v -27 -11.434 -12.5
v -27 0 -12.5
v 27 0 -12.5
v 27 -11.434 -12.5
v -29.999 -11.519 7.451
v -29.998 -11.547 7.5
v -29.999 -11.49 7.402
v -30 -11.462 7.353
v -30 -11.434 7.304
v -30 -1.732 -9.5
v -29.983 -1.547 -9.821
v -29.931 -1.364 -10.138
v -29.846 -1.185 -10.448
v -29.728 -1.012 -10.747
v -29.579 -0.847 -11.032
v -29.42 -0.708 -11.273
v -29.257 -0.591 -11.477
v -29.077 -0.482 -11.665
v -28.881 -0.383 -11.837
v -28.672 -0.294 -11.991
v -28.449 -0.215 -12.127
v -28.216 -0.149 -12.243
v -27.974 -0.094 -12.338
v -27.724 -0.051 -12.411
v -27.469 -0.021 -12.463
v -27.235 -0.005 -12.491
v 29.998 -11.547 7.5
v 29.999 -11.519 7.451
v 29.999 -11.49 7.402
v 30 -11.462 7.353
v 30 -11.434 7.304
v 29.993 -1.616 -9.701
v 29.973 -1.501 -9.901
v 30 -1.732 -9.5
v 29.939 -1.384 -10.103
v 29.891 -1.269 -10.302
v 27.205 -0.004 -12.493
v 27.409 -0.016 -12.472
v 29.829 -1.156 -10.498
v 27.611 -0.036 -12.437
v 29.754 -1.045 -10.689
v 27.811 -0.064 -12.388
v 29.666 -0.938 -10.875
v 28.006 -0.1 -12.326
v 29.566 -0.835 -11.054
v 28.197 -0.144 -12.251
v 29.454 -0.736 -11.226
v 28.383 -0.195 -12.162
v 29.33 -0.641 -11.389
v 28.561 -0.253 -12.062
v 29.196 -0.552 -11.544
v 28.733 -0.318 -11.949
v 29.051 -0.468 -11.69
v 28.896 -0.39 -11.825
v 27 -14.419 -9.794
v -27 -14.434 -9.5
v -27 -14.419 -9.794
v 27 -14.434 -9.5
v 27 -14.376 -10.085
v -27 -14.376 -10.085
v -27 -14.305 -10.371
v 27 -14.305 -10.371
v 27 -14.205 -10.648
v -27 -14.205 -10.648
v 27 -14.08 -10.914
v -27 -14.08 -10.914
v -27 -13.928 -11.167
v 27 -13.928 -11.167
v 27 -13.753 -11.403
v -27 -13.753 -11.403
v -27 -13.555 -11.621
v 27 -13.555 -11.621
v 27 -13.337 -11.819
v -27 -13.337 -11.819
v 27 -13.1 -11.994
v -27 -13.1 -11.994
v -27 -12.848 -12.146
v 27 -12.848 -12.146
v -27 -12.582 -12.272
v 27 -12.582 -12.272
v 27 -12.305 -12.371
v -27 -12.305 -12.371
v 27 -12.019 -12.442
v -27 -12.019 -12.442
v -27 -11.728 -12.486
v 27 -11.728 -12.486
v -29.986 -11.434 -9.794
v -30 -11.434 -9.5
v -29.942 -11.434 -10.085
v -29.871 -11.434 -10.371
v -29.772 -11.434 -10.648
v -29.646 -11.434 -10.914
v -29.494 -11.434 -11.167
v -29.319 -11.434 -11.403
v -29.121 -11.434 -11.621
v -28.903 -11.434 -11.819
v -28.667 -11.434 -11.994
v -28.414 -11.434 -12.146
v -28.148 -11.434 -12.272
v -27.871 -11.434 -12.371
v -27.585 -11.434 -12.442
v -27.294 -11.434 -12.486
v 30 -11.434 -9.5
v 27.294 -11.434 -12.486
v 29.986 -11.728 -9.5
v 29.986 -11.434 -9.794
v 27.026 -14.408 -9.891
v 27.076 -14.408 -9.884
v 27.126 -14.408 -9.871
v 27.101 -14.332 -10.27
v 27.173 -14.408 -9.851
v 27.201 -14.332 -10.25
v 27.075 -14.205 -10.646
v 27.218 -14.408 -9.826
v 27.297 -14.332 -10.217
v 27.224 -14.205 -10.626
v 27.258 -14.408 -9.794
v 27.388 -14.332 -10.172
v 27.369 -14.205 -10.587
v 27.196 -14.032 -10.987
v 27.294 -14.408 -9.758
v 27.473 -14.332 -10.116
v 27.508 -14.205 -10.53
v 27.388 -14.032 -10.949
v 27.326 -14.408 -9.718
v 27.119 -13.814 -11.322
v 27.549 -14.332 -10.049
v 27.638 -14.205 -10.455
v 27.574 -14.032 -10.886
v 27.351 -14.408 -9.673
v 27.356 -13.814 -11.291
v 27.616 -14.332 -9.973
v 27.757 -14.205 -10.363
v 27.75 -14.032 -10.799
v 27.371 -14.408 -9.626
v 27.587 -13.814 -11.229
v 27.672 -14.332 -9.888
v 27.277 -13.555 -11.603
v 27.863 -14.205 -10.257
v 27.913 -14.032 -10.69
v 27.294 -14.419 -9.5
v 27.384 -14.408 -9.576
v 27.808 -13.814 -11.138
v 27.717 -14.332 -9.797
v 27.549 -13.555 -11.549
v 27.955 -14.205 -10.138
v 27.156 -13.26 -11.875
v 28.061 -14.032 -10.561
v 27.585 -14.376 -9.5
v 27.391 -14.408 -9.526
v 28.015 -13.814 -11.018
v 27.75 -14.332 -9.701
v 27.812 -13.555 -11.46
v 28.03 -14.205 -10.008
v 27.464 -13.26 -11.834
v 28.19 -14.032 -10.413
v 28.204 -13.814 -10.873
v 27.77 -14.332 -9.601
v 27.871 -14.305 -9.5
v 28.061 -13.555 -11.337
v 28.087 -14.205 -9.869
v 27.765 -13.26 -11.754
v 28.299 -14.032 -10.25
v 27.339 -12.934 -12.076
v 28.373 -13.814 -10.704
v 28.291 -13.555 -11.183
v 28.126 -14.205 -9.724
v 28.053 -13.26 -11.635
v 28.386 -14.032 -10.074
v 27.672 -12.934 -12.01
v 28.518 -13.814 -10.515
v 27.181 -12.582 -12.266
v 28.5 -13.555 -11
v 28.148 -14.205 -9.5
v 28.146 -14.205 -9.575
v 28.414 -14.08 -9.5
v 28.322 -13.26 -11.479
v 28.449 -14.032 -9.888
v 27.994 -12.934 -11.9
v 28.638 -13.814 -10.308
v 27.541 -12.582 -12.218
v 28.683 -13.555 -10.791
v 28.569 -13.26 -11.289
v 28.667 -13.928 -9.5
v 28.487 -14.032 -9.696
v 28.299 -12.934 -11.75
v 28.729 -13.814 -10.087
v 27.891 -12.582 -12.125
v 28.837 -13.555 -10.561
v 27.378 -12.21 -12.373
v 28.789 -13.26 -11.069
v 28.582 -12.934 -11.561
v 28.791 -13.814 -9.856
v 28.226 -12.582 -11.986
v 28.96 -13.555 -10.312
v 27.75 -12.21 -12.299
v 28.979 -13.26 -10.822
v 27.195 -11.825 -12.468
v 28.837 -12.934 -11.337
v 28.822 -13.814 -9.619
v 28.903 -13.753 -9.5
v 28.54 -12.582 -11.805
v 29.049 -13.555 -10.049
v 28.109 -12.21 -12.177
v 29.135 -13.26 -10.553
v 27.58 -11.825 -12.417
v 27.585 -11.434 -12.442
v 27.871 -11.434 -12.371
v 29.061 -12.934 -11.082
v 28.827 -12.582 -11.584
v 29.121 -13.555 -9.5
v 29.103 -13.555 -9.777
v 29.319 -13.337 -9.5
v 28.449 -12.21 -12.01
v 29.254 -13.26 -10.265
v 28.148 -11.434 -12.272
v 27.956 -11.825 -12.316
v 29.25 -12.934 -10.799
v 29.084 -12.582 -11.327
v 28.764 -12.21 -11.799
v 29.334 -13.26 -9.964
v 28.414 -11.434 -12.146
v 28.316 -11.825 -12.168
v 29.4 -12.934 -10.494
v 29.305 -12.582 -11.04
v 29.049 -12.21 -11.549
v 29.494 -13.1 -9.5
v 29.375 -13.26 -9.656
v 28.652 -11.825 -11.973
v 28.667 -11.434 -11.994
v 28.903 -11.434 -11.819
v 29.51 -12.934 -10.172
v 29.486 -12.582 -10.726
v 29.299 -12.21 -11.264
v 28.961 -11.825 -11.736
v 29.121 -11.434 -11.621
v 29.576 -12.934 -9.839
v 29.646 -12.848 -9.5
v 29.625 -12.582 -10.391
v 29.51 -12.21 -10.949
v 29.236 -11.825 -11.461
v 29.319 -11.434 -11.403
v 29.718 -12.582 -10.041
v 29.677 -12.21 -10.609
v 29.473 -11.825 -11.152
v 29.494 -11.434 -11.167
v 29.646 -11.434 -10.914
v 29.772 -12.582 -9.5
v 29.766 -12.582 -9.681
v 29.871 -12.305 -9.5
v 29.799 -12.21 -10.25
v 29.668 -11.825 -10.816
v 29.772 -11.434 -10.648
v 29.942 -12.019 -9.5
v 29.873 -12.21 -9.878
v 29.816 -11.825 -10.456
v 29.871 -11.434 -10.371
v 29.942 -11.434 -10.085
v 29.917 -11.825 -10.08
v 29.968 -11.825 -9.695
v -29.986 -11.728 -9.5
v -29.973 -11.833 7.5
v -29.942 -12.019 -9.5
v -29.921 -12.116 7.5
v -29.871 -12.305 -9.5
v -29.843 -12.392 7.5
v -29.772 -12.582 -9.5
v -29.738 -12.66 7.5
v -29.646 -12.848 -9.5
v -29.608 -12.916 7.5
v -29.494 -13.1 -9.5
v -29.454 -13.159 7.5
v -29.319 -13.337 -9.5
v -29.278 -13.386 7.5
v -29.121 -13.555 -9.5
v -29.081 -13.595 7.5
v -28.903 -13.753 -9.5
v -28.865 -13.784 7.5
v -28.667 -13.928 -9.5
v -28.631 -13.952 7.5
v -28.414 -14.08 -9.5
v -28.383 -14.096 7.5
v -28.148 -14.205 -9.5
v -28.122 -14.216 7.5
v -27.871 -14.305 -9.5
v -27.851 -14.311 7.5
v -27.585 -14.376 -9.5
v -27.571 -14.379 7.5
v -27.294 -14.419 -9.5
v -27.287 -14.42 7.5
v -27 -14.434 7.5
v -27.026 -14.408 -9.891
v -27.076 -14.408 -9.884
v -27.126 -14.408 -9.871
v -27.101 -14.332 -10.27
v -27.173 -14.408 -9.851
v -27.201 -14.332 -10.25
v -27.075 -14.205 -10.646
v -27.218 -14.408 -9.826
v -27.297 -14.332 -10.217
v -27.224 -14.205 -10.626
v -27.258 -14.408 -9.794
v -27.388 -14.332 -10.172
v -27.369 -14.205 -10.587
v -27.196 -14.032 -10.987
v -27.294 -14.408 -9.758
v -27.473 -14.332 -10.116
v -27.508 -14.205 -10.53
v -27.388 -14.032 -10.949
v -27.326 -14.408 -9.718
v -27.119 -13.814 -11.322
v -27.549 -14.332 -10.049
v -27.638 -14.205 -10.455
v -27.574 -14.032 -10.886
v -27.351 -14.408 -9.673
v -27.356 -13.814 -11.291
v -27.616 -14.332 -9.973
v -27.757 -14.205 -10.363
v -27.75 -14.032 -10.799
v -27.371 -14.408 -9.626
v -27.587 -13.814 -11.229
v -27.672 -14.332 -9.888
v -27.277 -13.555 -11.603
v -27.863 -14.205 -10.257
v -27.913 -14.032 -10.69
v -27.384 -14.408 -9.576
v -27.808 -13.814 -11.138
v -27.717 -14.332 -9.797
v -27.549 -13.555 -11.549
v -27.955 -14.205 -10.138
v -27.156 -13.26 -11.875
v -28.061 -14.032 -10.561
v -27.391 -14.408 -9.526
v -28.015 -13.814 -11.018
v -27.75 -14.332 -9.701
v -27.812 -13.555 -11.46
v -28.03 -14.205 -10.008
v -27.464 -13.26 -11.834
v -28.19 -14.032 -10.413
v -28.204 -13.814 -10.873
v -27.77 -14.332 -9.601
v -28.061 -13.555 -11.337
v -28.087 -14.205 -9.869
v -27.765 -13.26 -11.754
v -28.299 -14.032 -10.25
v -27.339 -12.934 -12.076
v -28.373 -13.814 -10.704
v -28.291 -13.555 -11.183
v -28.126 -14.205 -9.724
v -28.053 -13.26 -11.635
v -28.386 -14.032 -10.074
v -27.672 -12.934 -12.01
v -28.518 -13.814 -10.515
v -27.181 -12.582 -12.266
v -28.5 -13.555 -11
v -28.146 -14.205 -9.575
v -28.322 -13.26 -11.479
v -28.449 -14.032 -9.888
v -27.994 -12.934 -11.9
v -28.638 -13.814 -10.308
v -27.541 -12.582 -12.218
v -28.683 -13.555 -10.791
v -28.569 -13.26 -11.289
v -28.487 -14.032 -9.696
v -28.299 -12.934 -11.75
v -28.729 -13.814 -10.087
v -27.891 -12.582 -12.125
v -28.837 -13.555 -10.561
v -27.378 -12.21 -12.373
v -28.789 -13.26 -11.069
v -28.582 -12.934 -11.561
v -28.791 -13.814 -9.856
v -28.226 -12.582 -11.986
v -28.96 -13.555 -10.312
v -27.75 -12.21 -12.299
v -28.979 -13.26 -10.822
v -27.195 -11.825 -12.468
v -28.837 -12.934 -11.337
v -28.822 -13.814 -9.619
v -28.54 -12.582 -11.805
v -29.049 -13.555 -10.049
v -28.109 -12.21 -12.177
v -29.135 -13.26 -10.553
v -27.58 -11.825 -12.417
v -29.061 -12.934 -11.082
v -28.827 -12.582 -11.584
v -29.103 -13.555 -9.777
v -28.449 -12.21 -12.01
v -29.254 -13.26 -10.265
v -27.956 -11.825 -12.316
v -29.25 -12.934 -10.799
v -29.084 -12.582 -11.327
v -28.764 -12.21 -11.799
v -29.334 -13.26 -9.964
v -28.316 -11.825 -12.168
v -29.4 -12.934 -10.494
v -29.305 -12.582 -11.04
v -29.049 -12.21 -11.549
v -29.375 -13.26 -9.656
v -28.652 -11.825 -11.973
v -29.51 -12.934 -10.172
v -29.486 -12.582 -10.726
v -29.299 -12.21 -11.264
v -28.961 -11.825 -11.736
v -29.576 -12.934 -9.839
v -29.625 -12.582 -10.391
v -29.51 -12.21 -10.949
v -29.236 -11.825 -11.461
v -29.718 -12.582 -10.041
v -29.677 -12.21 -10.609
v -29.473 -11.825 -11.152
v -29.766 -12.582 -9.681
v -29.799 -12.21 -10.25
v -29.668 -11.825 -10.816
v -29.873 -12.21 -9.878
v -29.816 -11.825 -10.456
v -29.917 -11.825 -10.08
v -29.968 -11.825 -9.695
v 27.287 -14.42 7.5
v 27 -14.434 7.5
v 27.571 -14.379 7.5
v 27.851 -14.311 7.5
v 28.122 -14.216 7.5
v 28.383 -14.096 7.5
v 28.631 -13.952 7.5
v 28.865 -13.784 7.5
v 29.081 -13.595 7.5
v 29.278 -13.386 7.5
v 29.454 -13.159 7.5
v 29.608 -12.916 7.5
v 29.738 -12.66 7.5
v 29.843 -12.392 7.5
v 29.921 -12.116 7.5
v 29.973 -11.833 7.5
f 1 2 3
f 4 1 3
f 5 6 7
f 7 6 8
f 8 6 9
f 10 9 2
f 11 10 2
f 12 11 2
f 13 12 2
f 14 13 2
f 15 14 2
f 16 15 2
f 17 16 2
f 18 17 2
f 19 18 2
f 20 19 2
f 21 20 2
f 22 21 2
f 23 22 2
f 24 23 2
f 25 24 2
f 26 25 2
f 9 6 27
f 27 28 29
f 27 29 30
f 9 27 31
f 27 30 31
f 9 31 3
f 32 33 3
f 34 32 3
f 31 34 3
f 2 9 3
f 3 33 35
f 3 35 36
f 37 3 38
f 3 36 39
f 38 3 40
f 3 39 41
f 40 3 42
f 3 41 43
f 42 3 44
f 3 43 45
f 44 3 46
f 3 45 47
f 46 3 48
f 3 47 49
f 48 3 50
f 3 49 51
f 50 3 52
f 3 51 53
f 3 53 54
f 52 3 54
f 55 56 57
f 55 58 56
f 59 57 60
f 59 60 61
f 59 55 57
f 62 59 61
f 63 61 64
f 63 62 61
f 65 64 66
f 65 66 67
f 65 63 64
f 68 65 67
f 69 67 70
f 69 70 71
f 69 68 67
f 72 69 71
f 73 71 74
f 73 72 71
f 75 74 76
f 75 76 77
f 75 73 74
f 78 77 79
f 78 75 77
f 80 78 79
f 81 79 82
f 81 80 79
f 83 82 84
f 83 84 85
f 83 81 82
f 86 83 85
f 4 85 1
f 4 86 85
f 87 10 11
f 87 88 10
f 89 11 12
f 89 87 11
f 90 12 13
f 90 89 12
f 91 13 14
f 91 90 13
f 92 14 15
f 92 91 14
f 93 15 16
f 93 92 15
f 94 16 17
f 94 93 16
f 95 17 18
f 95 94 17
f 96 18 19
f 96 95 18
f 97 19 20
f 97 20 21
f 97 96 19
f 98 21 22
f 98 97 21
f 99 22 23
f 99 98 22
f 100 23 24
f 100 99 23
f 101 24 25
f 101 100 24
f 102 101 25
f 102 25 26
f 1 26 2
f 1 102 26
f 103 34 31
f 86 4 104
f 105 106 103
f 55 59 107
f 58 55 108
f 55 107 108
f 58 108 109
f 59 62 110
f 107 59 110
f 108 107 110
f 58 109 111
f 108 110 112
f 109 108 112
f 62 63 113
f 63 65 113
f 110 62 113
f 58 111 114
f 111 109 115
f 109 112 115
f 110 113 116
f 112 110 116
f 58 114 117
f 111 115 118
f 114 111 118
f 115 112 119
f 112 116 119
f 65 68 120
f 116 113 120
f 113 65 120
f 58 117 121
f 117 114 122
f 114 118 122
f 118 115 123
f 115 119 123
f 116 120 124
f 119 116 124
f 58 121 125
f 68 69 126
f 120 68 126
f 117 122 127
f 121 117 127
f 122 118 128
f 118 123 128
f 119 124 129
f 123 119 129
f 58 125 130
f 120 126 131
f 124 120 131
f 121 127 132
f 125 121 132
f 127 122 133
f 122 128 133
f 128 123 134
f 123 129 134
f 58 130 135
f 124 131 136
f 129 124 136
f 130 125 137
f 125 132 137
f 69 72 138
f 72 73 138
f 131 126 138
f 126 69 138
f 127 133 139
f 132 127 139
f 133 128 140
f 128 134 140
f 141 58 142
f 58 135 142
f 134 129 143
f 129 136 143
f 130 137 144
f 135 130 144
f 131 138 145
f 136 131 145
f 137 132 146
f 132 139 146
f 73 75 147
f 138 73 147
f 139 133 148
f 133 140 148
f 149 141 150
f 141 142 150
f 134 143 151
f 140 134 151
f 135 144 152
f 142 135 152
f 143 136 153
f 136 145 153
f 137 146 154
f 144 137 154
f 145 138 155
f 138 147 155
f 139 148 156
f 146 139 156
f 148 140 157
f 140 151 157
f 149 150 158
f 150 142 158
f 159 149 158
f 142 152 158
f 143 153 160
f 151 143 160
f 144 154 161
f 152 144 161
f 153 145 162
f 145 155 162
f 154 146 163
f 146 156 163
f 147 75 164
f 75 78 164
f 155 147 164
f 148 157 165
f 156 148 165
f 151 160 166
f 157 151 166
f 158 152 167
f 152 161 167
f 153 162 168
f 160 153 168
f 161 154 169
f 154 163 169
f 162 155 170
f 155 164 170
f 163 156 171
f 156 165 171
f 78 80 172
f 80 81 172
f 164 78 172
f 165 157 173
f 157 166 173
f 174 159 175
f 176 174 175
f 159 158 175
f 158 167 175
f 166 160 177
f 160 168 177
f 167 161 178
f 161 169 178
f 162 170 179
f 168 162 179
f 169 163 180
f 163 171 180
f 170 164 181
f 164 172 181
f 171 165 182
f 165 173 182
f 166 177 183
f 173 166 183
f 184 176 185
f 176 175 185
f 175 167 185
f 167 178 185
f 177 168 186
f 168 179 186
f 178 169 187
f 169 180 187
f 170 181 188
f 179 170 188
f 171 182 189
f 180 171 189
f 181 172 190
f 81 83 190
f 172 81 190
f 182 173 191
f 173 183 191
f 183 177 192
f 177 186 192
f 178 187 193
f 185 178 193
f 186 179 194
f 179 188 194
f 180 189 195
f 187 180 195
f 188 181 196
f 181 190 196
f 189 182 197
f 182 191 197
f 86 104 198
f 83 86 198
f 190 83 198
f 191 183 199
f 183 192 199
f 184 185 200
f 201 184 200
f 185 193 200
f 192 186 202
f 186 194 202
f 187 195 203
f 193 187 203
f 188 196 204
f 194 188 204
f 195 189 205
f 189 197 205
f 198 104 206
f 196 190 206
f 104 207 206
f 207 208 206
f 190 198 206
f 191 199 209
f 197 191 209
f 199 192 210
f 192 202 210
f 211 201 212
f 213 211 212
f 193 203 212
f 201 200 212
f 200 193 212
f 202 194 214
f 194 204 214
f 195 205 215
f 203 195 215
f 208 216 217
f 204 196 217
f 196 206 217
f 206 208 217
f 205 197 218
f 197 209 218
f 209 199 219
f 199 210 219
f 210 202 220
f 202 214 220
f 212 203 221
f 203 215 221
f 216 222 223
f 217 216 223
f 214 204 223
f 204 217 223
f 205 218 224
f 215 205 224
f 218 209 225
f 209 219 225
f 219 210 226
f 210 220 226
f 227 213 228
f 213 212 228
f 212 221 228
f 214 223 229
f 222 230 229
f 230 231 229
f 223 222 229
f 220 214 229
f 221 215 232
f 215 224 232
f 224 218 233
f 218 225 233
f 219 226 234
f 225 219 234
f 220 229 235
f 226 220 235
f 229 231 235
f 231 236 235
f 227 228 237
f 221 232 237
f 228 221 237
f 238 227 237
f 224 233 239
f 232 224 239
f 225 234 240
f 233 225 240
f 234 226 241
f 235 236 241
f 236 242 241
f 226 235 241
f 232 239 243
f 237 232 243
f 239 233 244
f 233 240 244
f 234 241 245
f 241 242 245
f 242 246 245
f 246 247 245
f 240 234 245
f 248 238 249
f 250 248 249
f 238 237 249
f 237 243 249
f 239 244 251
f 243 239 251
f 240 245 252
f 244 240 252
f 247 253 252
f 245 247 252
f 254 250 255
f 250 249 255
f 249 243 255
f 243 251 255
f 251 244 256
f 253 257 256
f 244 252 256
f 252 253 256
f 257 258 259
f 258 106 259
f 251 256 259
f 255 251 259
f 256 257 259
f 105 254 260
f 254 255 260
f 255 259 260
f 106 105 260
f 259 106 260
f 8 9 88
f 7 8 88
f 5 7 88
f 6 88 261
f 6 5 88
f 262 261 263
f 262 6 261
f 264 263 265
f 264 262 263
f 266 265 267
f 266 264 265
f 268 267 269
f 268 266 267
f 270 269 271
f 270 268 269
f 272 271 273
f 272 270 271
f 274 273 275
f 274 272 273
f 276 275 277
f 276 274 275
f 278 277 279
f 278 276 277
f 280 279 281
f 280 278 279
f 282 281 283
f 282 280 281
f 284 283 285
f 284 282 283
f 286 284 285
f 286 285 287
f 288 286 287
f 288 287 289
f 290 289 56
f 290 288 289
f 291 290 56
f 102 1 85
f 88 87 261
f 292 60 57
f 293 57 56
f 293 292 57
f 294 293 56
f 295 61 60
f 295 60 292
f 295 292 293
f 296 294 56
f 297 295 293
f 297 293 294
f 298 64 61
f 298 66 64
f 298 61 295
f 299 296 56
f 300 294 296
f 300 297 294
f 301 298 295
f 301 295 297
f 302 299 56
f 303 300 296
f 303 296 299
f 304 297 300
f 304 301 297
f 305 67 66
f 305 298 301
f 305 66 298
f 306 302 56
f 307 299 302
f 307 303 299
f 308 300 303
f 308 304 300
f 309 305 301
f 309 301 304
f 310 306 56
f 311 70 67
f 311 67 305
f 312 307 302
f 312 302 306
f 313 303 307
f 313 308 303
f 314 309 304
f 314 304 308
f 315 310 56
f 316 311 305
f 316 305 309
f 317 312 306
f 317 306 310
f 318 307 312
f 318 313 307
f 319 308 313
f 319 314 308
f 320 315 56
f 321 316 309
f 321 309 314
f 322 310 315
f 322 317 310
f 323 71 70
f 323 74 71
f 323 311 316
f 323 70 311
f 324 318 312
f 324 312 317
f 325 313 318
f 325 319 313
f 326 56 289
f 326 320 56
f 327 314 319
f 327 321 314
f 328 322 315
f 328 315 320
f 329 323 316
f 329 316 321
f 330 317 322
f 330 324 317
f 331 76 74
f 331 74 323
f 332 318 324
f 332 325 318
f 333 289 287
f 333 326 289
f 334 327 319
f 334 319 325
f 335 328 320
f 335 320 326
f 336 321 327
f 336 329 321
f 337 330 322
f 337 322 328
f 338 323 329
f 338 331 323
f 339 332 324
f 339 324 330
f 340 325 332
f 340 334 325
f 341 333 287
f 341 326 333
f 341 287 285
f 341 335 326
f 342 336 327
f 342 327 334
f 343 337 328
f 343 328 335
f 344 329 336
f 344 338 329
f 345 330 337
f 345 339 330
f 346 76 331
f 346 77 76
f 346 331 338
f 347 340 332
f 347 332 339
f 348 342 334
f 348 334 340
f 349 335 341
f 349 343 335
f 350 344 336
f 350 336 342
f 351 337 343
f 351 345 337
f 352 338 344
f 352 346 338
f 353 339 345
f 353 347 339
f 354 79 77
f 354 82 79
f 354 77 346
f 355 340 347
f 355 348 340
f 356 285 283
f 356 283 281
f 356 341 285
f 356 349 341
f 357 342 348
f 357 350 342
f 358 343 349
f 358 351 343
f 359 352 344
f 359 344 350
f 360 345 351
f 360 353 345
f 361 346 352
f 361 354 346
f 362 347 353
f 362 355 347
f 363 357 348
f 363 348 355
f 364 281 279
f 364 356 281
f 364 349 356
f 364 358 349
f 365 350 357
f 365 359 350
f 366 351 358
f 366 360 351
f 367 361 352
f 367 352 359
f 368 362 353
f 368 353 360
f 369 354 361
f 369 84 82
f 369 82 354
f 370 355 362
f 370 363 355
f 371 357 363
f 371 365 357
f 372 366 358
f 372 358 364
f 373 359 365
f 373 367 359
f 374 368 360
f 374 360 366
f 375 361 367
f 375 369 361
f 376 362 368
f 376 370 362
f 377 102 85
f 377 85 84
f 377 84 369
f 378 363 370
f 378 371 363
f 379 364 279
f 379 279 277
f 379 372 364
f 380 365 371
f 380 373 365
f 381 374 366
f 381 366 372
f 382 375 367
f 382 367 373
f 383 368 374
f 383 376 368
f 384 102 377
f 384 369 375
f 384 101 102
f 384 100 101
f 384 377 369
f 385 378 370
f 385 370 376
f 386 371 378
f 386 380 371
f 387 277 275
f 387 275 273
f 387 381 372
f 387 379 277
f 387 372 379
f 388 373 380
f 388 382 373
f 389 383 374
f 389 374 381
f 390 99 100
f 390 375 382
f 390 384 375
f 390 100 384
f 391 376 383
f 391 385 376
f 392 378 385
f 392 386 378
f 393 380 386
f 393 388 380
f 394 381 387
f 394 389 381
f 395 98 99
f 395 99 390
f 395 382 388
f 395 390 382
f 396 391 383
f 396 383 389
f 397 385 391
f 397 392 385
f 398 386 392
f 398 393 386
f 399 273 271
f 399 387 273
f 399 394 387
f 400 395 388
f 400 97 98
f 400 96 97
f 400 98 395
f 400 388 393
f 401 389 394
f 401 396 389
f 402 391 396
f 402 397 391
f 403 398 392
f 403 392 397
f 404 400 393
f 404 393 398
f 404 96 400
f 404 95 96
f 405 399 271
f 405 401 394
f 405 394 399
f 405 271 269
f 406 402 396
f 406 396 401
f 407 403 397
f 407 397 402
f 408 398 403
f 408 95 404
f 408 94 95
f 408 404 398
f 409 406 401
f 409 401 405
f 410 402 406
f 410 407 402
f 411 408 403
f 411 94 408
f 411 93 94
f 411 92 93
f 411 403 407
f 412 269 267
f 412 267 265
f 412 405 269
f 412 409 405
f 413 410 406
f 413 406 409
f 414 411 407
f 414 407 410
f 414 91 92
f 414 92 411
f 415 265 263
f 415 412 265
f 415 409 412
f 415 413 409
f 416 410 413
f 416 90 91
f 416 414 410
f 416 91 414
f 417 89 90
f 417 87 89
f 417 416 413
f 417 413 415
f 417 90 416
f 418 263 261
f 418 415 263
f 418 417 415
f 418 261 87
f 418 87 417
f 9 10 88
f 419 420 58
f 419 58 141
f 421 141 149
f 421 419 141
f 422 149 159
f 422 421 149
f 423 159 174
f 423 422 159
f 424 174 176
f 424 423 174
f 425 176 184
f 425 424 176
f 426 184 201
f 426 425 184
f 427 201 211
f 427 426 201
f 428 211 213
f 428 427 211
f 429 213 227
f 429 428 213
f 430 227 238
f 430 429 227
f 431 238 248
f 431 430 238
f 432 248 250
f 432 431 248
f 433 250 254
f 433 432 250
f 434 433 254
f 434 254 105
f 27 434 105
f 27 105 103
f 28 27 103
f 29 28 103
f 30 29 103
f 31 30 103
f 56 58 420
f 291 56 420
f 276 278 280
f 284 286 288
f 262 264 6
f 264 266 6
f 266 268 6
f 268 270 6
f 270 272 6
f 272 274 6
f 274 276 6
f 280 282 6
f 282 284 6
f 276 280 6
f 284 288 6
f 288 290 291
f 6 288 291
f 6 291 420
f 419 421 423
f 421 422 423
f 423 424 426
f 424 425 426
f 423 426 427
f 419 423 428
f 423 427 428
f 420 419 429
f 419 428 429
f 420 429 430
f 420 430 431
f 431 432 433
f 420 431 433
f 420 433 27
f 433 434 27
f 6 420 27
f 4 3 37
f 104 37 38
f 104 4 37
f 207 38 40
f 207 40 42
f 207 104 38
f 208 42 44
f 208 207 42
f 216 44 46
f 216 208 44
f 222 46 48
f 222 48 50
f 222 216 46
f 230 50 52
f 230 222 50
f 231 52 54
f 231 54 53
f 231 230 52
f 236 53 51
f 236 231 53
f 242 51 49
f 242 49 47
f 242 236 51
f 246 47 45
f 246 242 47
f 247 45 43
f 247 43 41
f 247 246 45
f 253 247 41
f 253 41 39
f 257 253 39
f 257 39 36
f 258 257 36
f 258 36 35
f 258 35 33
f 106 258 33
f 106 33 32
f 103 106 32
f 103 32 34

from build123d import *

# Parameters (mm, degrees)
F0_W     = 60
F0_H     = 25
F1_DEPTH = 18
F3_DEPTH = 30
F4_R     = 3


# Not quite as in the source:
# - a feature names something its author has since deleted; it is built from what else it names


with BuildPart() as f1:
    # F0 (on Front) → F1 (new body)
    with BuildSketch(Plane.XZ):
        Rectangle(F0_W, F0_H)
    extrude(amount=F1_DEPTH)

    # F2 (on Right) → F3 (cut, symmetric)
    with BuildSketch(Plane.YZ):
        Polygon((0, 12.5), (-14.4337567297, 12.5), (-11.5470053838, 7.5), (0, -12.5), (0, 0), align=None)
        Polygon((-14.4337567297, 7.5), (-14.4337567297, 12.5), (-17.3205080757, 12.5), (-19.7896268219, 12.5), (-19.7896268219, -12.5), (-17.3205080757, -12.5), (-14.4337567297, -12.5), align=None)
        Polygon((-11.5470053838, 7.5), (-14.4337567297, 12.5), (-14.4337567297, 7.5), align=None)
    extrude(amount=F3_DEPTH, both=True, mode=Mode.SUBTRACT)

    # F4
    f4_edges = [f1.edges().sort_by_distance(p)[0] for p in [
        (30, -7.216878, -12.5),
        (-30, -7.216878, -12.5),
        (0, -14.433757, -12.5),
        (30, -14.433757, -2.5),
        (-30, -14.433757, -2.5),
    ]]
    fillet(f4_edges, radius=F4_R)


solid = f1.part
